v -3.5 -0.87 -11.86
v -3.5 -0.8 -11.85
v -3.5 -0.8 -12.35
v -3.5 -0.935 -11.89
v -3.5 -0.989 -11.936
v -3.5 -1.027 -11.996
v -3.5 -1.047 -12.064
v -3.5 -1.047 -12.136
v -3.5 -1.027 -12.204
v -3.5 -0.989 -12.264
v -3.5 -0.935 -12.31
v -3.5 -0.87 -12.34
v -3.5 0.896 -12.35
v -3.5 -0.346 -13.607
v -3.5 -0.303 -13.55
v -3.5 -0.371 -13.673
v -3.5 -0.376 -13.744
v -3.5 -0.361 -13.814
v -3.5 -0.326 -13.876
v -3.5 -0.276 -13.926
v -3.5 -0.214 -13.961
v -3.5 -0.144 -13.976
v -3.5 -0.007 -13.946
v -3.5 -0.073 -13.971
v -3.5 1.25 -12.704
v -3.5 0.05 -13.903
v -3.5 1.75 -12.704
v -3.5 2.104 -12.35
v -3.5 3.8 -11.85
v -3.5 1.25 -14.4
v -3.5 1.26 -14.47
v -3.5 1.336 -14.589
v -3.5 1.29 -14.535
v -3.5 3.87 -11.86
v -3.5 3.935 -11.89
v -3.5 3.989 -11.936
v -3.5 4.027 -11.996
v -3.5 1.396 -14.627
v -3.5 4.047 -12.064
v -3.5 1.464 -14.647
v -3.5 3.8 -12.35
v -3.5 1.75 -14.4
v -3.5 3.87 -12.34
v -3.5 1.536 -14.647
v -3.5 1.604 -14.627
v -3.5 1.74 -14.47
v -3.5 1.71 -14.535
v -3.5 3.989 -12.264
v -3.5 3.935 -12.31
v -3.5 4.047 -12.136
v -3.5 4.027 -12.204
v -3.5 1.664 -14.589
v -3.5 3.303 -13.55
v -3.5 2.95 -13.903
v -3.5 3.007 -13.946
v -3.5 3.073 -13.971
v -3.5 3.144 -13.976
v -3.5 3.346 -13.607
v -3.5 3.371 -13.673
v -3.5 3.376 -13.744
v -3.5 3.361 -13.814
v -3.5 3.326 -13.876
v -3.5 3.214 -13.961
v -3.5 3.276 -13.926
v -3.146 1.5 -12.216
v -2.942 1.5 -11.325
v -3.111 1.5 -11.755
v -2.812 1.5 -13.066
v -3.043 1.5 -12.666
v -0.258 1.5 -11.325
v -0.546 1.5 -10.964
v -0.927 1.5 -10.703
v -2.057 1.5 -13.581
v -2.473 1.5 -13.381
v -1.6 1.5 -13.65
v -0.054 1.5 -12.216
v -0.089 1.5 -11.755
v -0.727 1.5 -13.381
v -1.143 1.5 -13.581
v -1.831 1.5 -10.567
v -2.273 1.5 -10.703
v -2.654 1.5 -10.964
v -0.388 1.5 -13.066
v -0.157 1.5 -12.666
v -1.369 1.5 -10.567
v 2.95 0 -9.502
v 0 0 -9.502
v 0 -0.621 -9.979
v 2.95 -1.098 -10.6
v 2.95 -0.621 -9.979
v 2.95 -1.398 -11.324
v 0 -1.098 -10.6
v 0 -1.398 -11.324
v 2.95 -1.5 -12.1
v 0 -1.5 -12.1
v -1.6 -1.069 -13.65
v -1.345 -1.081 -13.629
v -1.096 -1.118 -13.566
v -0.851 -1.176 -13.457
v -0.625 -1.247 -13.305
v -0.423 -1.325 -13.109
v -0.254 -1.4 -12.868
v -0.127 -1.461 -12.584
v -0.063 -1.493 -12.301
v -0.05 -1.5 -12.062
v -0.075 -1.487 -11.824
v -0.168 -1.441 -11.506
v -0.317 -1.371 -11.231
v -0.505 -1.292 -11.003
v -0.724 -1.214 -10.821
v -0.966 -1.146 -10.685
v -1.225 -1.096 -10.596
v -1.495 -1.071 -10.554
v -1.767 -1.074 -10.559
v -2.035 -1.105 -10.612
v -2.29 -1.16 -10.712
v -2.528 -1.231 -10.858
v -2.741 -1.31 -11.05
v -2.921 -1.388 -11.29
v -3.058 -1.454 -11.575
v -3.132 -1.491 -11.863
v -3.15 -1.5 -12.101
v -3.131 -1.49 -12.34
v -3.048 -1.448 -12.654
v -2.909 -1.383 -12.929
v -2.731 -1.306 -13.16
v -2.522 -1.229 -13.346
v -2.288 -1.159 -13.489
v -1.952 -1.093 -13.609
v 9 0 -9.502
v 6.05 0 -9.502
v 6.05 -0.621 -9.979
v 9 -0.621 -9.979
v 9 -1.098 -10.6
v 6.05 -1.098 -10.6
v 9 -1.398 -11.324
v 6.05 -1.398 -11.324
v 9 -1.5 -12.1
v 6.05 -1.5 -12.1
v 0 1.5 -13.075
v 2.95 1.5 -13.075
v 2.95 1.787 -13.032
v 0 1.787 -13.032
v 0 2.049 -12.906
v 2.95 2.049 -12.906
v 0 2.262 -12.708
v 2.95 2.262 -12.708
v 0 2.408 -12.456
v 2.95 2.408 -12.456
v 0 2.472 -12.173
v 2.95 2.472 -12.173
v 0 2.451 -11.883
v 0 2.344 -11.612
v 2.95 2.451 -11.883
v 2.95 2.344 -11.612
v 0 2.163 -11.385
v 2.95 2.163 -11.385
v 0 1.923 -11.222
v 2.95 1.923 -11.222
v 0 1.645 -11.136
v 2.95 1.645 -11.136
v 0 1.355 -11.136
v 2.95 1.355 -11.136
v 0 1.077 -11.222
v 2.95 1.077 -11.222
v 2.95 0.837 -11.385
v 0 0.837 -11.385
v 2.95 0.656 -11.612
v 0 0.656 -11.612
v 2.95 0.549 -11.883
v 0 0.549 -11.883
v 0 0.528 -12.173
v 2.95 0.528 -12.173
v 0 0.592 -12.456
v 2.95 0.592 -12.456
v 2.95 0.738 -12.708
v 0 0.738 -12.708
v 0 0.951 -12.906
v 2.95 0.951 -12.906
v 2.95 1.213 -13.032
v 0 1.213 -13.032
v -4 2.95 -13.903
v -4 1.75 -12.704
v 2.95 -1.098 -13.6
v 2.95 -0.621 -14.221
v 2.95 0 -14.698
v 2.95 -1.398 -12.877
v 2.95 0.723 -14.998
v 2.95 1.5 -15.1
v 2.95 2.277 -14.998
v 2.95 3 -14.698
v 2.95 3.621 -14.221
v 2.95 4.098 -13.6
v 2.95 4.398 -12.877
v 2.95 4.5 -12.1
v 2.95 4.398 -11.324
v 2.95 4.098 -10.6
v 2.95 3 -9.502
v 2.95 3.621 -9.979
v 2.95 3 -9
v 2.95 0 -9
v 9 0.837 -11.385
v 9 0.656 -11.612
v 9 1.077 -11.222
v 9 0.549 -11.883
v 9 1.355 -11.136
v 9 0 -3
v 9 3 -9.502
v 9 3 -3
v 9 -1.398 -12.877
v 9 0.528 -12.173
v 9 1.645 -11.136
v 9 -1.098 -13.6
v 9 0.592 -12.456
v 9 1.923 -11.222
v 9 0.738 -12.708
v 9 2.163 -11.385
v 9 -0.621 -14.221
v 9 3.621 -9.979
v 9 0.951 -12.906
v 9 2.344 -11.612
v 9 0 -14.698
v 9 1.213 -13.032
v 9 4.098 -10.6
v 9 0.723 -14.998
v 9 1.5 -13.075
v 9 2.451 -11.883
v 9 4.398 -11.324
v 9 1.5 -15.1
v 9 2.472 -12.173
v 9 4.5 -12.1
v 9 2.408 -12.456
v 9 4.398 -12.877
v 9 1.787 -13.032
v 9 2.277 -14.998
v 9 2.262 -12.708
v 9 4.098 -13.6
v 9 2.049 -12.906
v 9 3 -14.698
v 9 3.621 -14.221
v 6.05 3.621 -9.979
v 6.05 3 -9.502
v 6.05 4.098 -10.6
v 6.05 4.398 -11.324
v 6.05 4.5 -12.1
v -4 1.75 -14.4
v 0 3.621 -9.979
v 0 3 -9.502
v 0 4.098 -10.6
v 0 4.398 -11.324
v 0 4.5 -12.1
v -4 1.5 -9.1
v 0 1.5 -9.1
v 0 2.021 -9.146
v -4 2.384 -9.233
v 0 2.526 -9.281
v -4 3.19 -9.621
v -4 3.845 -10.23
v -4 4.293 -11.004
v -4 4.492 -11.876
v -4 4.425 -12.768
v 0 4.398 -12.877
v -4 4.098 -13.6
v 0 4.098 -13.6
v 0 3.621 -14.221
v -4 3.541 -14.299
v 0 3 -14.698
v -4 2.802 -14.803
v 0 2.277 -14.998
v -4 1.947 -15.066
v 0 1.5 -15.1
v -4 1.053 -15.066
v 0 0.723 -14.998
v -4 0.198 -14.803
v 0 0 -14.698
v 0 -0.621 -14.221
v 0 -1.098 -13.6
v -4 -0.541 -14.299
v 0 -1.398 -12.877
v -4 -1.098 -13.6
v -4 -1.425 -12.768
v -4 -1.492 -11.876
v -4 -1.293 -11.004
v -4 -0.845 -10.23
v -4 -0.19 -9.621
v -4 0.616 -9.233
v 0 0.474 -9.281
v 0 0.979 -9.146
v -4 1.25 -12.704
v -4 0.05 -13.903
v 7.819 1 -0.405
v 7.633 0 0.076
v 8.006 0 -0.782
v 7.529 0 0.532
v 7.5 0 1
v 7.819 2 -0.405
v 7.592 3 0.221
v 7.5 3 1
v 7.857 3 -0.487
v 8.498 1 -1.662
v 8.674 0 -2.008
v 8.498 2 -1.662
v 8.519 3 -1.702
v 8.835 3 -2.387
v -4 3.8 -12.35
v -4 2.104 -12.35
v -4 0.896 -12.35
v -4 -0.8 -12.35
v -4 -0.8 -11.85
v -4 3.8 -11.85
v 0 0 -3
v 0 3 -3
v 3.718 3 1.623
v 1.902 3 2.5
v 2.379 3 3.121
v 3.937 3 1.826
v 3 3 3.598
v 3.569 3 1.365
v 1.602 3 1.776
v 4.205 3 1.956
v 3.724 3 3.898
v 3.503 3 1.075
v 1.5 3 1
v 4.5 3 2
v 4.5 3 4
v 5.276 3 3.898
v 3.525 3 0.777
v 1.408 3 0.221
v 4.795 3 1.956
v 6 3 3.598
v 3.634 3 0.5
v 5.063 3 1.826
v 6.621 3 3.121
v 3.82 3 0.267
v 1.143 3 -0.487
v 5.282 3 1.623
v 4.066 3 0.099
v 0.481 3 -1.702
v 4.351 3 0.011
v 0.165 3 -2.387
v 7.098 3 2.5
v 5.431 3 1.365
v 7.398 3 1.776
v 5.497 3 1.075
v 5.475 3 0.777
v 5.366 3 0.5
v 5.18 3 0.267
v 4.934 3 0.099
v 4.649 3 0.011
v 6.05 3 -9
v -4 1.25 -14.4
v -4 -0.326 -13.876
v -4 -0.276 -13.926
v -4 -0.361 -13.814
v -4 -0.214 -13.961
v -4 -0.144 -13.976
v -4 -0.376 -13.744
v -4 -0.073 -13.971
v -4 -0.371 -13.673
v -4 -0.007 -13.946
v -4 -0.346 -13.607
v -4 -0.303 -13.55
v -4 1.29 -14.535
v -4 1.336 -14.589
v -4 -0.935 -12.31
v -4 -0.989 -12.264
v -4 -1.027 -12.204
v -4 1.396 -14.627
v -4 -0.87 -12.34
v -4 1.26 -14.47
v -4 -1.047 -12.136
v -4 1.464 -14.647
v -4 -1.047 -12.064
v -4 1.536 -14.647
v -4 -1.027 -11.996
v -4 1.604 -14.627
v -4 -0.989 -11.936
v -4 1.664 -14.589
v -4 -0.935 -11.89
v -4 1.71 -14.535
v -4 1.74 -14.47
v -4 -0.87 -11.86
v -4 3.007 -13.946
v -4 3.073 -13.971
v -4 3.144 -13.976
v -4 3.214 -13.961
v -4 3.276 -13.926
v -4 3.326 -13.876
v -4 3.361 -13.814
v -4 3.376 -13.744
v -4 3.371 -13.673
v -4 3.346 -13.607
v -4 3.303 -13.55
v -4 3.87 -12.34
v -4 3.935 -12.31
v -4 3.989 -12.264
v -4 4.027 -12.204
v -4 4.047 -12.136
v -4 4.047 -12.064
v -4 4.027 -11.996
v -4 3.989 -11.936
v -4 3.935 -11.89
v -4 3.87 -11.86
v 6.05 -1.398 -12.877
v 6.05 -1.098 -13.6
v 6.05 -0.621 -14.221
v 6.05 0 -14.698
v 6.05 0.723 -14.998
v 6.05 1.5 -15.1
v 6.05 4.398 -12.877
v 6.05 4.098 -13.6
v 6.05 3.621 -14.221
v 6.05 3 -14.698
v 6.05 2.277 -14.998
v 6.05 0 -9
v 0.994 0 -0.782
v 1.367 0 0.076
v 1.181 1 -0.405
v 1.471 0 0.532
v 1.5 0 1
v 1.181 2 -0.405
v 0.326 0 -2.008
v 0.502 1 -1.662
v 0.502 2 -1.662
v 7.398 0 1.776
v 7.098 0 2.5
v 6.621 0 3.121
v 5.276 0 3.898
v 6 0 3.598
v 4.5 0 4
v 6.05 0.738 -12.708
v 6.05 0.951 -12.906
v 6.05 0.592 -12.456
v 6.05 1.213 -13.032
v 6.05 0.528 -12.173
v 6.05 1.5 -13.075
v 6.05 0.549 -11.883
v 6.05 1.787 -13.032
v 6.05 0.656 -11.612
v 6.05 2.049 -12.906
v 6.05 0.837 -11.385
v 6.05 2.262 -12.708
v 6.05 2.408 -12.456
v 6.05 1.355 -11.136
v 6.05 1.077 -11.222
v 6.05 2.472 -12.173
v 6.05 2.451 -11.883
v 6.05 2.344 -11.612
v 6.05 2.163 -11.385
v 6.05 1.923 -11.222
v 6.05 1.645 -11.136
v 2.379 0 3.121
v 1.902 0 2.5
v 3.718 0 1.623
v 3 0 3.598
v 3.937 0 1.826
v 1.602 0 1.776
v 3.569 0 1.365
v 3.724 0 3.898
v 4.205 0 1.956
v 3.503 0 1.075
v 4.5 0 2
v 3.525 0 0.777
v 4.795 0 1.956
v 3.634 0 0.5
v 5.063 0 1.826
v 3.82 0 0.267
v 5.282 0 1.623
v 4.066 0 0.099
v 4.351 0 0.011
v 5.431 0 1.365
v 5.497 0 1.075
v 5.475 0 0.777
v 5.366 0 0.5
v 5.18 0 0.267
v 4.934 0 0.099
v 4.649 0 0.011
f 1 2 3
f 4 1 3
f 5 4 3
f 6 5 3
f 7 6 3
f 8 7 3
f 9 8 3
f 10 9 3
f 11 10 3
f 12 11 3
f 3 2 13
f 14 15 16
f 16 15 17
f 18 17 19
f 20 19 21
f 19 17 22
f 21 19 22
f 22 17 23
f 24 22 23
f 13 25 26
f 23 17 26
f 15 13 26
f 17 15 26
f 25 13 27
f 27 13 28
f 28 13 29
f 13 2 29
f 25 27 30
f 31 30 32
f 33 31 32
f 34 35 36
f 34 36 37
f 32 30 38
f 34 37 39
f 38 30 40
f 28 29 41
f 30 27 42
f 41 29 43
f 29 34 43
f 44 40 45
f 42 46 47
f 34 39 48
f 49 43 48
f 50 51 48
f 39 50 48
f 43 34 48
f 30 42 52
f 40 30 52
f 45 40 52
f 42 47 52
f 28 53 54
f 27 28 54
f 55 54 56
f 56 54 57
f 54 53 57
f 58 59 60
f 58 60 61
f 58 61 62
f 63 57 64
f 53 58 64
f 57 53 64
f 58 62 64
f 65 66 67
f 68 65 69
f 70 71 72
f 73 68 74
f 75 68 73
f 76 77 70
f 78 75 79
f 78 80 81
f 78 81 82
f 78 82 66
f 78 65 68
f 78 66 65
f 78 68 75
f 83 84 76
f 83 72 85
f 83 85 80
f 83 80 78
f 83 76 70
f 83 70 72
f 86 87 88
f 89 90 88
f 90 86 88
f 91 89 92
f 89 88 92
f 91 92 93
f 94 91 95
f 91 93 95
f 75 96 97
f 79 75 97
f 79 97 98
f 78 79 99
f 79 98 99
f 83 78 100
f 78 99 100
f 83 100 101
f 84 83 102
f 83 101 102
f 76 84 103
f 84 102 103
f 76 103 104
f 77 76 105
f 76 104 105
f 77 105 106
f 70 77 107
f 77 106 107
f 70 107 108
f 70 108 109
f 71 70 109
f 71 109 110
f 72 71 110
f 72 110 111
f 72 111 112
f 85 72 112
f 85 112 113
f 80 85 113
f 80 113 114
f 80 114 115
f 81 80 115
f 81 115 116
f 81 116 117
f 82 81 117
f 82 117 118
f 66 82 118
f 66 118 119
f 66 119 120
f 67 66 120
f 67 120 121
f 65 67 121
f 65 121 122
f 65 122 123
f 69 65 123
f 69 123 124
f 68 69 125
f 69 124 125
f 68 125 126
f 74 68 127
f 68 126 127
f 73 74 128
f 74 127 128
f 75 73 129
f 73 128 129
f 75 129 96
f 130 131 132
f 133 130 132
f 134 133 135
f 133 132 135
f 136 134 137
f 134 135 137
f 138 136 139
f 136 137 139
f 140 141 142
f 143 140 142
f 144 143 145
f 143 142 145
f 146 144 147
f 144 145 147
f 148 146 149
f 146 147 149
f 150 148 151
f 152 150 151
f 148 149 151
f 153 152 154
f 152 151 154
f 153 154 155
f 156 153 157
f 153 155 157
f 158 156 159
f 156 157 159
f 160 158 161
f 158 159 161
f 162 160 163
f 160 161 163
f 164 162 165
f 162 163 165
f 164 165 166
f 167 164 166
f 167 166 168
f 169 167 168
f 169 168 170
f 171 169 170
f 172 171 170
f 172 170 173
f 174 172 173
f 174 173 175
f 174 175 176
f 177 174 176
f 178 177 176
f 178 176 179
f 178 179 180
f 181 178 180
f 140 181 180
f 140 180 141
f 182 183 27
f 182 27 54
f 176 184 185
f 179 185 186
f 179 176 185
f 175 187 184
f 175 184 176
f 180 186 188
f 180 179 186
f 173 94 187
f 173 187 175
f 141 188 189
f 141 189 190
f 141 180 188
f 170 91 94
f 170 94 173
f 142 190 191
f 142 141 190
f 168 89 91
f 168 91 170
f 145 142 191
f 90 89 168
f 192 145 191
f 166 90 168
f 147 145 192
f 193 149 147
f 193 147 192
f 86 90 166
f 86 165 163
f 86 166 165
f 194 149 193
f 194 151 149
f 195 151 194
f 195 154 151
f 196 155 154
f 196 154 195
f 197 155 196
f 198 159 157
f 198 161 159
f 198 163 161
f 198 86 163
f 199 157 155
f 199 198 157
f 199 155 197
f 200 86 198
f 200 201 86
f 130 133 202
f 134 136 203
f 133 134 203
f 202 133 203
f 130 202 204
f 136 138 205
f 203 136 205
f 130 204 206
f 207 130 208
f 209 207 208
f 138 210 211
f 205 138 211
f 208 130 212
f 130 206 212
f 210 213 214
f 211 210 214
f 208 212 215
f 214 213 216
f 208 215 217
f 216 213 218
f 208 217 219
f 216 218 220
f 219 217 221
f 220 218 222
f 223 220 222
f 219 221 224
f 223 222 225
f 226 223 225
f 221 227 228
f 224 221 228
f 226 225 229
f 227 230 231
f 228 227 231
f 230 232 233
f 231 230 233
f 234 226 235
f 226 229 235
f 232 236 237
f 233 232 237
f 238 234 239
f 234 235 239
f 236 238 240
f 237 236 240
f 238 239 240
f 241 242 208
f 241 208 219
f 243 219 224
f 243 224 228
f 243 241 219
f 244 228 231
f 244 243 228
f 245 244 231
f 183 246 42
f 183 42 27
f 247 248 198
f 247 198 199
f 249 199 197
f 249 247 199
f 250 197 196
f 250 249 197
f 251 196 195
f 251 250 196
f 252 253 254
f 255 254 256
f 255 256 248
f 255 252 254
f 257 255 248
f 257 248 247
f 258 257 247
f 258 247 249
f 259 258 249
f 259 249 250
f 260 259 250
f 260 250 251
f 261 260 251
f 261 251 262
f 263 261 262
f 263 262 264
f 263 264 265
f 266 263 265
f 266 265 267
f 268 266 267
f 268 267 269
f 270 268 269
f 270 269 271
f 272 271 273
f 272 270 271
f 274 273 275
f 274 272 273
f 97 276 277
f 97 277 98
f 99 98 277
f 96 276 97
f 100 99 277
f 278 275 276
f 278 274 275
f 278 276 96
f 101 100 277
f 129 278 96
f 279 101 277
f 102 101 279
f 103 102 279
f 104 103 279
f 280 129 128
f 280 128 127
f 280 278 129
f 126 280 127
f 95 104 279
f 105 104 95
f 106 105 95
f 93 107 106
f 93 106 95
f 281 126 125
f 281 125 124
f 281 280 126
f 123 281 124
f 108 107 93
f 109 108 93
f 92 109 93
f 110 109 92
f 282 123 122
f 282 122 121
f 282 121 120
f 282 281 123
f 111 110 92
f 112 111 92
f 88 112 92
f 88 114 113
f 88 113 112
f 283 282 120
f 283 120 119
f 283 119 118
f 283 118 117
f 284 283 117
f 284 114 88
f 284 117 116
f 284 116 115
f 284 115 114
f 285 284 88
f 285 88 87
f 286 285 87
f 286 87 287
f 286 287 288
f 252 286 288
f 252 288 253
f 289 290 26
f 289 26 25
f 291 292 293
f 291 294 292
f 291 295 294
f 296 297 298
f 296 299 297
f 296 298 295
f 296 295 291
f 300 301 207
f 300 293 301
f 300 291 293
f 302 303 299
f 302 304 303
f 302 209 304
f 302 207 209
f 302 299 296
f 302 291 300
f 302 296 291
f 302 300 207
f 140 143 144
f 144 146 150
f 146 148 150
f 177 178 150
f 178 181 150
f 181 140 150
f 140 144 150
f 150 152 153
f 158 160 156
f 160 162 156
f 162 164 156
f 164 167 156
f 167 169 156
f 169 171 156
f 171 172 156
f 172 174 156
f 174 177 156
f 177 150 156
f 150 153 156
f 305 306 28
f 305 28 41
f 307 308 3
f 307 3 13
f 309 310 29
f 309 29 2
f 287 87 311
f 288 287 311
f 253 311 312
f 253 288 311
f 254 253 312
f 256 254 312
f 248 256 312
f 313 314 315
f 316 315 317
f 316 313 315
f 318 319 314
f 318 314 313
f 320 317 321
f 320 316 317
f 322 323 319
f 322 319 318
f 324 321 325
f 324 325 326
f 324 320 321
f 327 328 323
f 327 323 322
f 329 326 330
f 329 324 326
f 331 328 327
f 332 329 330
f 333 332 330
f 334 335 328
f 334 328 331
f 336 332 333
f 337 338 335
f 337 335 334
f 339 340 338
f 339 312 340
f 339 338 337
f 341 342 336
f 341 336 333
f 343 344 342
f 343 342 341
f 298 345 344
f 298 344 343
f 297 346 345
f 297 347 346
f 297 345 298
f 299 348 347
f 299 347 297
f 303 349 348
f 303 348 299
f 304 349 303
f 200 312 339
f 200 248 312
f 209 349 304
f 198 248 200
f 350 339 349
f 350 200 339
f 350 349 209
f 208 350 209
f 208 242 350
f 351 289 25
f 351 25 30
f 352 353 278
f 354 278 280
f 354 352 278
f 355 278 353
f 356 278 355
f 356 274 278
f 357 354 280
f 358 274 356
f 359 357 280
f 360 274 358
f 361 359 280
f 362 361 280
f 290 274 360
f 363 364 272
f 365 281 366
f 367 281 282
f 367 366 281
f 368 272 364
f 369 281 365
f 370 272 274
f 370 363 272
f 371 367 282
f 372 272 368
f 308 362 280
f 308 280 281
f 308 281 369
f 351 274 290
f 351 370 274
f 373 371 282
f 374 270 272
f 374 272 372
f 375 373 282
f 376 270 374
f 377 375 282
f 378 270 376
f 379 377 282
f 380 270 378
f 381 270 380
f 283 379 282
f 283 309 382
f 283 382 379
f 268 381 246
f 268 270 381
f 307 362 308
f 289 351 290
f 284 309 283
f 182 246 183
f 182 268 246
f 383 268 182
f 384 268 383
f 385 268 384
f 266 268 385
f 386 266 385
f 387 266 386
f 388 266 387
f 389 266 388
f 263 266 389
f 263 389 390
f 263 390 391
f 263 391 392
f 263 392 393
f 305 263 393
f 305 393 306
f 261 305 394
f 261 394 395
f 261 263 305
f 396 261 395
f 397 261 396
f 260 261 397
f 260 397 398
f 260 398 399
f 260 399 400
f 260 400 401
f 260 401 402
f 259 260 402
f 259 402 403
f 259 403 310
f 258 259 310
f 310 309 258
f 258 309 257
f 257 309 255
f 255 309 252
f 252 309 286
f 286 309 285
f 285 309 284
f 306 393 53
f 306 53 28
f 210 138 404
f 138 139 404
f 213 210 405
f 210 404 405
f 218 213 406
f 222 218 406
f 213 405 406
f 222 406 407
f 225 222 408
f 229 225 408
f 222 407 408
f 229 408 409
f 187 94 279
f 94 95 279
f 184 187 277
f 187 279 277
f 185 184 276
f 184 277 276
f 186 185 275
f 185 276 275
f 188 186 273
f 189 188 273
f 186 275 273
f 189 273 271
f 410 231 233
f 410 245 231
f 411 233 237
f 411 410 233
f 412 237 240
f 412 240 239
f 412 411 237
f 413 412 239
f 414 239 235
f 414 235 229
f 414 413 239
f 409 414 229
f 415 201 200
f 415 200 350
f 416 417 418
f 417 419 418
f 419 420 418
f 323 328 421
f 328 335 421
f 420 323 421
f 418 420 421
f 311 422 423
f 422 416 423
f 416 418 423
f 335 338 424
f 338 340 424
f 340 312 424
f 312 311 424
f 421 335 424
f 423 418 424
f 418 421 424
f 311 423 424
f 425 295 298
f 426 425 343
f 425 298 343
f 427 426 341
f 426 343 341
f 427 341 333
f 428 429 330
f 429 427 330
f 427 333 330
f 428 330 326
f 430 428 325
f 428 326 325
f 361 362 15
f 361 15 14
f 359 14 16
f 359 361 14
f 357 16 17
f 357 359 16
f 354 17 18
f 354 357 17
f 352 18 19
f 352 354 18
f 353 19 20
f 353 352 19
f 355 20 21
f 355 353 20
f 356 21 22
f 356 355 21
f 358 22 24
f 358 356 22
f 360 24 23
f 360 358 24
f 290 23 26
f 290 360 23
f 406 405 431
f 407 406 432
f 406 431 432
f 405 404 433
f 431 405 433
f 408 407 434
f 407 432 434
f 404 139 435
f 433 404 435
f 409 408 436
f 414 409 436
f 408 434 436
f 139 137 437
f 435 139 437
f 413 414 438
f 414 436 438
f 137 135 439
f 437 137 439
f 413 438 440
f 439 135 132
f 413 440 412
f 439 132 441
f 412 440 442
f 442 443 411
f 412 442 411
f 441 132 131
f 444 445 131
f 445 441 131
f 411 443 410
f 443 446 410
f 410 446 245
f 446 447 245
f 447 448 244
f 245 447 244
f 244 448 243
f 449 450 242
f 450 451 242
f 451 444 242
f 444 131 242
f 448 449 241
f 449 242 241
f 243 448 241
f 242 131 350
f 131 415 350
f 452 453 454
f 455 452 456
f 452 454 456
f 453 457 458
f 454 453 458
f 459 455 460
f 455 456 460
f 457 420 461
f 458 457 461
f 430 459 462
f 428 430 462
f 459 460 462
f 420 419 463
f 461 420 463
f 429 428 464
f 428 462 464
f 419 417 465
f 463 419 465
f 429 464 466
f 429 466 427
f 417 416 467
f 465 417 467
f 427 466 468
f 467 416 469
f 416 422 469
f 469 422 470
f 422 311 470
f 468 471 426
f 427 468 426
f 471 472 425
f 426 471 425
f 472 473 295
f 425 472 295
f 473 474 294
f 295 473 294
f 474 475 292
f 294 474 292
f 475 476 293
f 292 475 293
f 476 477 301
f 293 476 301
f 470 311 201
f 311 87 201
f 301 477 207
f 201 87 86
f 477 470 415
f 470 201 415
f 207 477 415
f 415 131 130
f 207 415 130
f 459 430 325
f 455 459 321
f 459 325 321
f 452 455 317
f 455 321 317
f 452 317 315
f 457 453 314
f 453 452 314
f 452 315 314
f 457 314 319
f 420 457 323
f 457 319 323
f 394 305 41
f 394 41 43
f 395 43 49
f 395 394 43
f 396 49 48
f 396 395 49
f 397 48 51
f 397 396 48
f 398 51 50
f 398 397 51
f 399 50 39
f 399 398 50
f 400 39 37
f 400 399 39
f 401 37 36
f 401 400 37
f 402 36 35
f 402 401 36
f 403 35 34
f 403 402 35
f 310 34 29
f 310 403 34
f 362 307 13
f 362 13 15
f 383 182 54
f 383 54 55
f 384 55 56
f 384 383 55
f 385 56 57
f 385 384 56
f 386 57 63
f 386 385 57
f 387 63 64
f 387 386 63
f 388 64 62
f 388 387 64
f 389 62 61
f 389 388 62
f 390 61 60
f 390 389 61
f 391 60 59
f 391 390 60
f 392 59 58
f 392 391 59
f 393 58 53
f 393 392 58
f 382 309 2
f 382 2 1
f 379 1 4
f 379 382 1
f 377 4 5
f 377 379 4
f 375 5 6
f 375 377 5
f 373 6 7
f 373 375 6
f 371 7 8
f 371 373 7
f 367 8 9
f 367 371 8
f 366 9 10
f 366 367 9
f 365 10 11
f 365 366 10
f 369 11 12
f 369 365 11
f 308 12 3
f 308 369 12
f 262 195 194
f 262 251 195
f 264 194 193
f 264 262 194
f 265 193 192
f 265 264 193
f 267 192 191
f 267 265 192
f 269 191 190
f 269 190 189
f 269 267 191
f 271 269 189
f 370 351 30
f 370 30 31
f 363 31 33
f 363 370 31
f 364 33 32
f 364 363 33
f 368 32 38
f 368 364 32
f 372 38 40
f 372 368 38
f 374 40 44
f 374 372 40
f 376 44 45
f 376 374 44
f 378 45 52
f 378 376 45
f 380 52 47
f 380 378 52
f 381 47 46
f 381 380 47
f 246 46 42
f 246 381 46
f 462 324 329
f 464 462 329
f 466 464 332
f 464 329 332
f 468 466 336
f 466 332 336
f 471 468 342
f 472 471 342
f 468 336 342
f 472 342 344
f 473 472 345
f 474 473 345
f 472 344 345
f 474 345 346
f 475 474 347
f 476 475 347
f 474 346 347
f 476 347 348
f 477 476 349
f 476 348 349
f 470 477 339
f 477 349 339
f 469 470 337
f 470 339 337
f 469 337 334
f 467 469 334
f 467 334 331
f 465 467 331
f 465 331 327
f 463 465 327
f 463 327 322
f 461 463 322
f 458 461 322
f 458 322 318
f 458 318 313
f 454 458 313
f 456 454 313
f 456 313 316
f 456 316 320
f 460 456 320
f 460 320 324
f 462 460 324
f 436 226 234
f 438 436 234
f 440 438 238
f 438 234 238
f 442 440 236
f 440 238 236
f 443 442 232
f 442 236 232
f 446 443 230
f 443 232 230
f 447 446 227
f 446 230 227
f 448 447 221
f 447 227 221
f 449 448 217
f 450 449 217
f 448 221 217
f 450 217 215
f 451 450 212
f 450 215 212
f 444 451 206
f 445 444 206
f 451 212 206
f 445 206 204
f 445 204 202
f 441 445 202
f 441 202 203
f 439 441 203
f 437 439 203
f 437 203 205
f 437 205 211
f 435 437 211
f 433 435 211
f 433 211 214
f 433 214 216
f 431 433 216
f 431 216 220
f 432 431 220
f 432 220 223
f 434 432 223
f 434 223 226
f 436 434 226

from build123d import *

# Parameters (mm, degrees)
SKETCH1_W           = 9
SKETCH1_H           = 9
BOSS_EXTRUDE1_DEPTH = 3
SKETCH2_W           = 2.95
SKETCH2_H           = 6
BOSS_EXTRUDE2_DEPTH = 6.1
FILLET1_R           = 3
SKETCH3_R           = 0.975
CUT_EXTRUDE1_DEPTH  = 11.1
CUT_EXTRUDE3_DEPTH  = 21.1
BOSS_EXTRUDE3_START = 4
SKETCH5_R           = 3
BOSS_EXTRUDE3_DEPTH = 4
SKETCH8_R           = 1.55
CUT_EXTRUDE4_DEPTH  = 3
CUT_EXTRUDE5_DEPTH  = 0.5
SKETCH10_W          = 9
SKETCH10_H          = 3
BOSS_EXTRUDE4_DEPTH = 4
SKETCH11_R          = 1
CUT_EXTRUDE6_DEPTH  = 4
CUT_EXTRUDE7_DEPTH  = 4


with BuildPart() as part:
    # Sketch1 → Boss-Extrude1 (new body)
    with BuildSketch(Plane(origin=(0, 0, 0), x_dir=(1, 0, 0), z_dir=(0, 1, 0))):
        with Locations((4.5, 4.5)):
            Rectangle(SKETCH1_W, SKETCH1_H)
    extrude(amount=BOSS_EXTRUDE1_DEPTH)

    # Sketch2 → Boss-Extrude2 (add)
    with BuildSketch(Plane(origin=(0, 0, -9), x_dir=(-1, 0, 0), z_dir=(0, 0, -1))):
        with Locations((-7.525, 1.5)):
            Rectangle(SKETCH2_W, SKETCH2_H)
        with Locations((-1.475, 1.5)):
            Rectangle(SKETCH2_W, SKETCH2_H)
    extrude(amount=BOSS_EXTRUDE2_DEPTH)

    # Fillet1
    fillet1_edges = [part.edges().sort_by_distance(p)[0] for p in [
        (1.475, 4.5, -15.1),
        (1.475, -1.5, -15.1),
        (7.525, -1.5, -15.1),
        (7.525, 4.5, -15.1),
    ]]
    fillet(fillet1_edges, radius=FILLET1_R - 0.0001)  # a hair under: the kernel refuses the full size

    # Sketch3 → Cut-Extrude1 (cut)
    with BuildSketch(Plane(origin=(9, 0, 0), x_dir=(0, 0, -1), z_dir=(1, 0, 0))):
        with Locations((12.1, 1.5)):
            Circle(SKETCH3_R)
    extrude(amount=-CUT_EXTRUDE1_DEPTH, mode=Mode.SUBTRACT)

    # Sketch6 → Cut-Extrude3 (cut)
    with BuildSketch(Plane.ZY):
        with BuildLine():
            Line((-12.1, 4.5), (-9, 4.5))
            Line((-9, 4.5), (-9, 3))
            Line((-9, 3), (-9.501923789, 3))
            ThreePointArc((-9.501923789, 3), (-10.6, 4.098076211), (-12.1, 4.5))
        make_face()
        with BuildLine():
            Line((-12.1, -1.5), (-9, -1.5))
            Line((-9, -1.5), (-9, 0))
            Line((-9, 0), (-9.501923789, 0))
            ThreePointArc((-9.501923789, 0), (-10.6, -1.098076211), (-12.1, -1.5))
        make_face()
    extrude(amount=-CUT_EXTRUDE3_DEPTH, mode=Mode.SUBTRACT)

    # Sketch5 → Boss-Extrude3 (add)
    with BuildSketch(Plane.ZY.offset(BOSS_EXTRUDE3_START)):
        with Locations((-12.1, 1.5)):
            Circle(SKETCH5_R)
    extrude(amount=-BOSS_EXTRUDE3_DEPTH)

    # Sketch8 → Cut-Extrude4 (cut)
    with BuildSketch(Plane(origin=(0, -1.5, 0), x_dir=(-1, 0, 0), z_dir=(0, -1, 0))):
        with Locations(Location((1.6, 12.1, 0), (0, 0, 90))):
            Circle(SKETCH8_R)
    extrude(amount=-CUT_EXTRUDE4_DEPTH, mode=Mode.SUBTRACT)

    # Sketch9 → Cut-Extrude5 (cut)
    with BuildSketch(Plane.ZY.offset(4)):
        with BuildLine():
            Line((-11.85, 1.5), (-11.85, -0.8))
            ThreePointArc((-11.85, -0.8), (-12.1, -1.05), (-12.35, -0.8))
            Line((-12.35, -0.8), (-12.35, 0.896446609))
            Line((-12.35, 0.896446609), (-13.549568901, -0.303122292))
            ThreePointArc((-13.549568901, -0.303122292), (-13.903122292, -0.303122292), (-13.903122292, 0.050431099))
            Line((-13.903122292, 0.050431099), (-12.703553391, 1.25))
            Line((-12.703553391, 1.25), (-14.4, 1.25))
            ThreePointArc((-14.4, 1.25), (-14.65, 1.5), (-14.4, 1.75))
            Line((-14.4, 1.75), (-12.703553391, 1.75))
            Line((-12.703553391, 1.75), (-13.903122292, 2.949568901))
            ThreePointArc((-13.903122292, 2.949568901), (-13.903122292, 3.303122292), (-13.549568901, 3.303122292))
            Line((-13.549568901, 3.303122292), (-12.35, 2.103553391))
            Line((-12.35, 2.103553391), (-12.35, 3.8))
            ThreePointArc((-12.35, 3.8), (-12.1, 4.05), (-11.85, 3.8))
            Line((-11.85, 3.8), (-11.85, 1.5))
        make_face()
    extrude(amount=-CUT_EXTRUDE5_DEPTH, mode=Mode.SUBTRACT)

    # Sketch10 → Boss-Extrude4 (add)
    with BuildSketch(Plane.XY):
        with Locations((4.5, 1.5)):
            Rectangle(SKETCH10_W, SKETCH10_H)
    extrude(amount=BOSS_EXTRUDE4_DEPTH)

    # Sketch11 → Cut-Extrude6 (cut)
    with BuildSketch(Plane(origin=(0, 3, 0), x_dir=(1, 0, 0), z_dir=(0, 1, 0))):
        with Locations(Location((4.5, -1, 0), (0, 0, 270))):
            Circle(SKETCH11_R)
    extrude(amount=-CUT_EXTRUDE6_DEPTH, mode=Mode.SUBTRACT)

    # Sketch12 → Cut-Extrude7 (cut)
    with BuildSketch(Plane(origin=(0, 3, 0), x_dir=(1, 0, 0), z_dir=(0, 1, 0))):
        with BuildLine():
            add(Edge.make_bspline(
                [(1.5, -1), (1.53988428, 0.555027292), (0.235256098, 1.545486909), (0, 3)],
                knots=[0, 0, 0, 0, 1, 1, 1, 1], degree=3))
            Line((0, 3), (0, -4))
            Line((0, -4), (4.5, -4))
            ThreePointArc((4.5, -4), (2.378679656, -3.121320344), (1.5, -1))
        make_face()
        with BuildLine():
            ThreePointArc((7.5, -1), (6.621320344, -3.121320344), (4.5, -4))
            Line((4.5, -4), (9, -4))
            Line((9, -4), (9, 3))
            add(Edge.make_bspline(
                [(7.5, -1), (7.46011572, 0.555027292), (8.764743902, 1.545486909), (9, 3)],
                knots=[0, 0, 0, 0, 1, 1, 1, 1], degree=3))
        make_face()
    extrude(amount=-CUT_EXTRUDE7_DEPTH, mode=Mode.SUBTRACT)


solid = part.part
